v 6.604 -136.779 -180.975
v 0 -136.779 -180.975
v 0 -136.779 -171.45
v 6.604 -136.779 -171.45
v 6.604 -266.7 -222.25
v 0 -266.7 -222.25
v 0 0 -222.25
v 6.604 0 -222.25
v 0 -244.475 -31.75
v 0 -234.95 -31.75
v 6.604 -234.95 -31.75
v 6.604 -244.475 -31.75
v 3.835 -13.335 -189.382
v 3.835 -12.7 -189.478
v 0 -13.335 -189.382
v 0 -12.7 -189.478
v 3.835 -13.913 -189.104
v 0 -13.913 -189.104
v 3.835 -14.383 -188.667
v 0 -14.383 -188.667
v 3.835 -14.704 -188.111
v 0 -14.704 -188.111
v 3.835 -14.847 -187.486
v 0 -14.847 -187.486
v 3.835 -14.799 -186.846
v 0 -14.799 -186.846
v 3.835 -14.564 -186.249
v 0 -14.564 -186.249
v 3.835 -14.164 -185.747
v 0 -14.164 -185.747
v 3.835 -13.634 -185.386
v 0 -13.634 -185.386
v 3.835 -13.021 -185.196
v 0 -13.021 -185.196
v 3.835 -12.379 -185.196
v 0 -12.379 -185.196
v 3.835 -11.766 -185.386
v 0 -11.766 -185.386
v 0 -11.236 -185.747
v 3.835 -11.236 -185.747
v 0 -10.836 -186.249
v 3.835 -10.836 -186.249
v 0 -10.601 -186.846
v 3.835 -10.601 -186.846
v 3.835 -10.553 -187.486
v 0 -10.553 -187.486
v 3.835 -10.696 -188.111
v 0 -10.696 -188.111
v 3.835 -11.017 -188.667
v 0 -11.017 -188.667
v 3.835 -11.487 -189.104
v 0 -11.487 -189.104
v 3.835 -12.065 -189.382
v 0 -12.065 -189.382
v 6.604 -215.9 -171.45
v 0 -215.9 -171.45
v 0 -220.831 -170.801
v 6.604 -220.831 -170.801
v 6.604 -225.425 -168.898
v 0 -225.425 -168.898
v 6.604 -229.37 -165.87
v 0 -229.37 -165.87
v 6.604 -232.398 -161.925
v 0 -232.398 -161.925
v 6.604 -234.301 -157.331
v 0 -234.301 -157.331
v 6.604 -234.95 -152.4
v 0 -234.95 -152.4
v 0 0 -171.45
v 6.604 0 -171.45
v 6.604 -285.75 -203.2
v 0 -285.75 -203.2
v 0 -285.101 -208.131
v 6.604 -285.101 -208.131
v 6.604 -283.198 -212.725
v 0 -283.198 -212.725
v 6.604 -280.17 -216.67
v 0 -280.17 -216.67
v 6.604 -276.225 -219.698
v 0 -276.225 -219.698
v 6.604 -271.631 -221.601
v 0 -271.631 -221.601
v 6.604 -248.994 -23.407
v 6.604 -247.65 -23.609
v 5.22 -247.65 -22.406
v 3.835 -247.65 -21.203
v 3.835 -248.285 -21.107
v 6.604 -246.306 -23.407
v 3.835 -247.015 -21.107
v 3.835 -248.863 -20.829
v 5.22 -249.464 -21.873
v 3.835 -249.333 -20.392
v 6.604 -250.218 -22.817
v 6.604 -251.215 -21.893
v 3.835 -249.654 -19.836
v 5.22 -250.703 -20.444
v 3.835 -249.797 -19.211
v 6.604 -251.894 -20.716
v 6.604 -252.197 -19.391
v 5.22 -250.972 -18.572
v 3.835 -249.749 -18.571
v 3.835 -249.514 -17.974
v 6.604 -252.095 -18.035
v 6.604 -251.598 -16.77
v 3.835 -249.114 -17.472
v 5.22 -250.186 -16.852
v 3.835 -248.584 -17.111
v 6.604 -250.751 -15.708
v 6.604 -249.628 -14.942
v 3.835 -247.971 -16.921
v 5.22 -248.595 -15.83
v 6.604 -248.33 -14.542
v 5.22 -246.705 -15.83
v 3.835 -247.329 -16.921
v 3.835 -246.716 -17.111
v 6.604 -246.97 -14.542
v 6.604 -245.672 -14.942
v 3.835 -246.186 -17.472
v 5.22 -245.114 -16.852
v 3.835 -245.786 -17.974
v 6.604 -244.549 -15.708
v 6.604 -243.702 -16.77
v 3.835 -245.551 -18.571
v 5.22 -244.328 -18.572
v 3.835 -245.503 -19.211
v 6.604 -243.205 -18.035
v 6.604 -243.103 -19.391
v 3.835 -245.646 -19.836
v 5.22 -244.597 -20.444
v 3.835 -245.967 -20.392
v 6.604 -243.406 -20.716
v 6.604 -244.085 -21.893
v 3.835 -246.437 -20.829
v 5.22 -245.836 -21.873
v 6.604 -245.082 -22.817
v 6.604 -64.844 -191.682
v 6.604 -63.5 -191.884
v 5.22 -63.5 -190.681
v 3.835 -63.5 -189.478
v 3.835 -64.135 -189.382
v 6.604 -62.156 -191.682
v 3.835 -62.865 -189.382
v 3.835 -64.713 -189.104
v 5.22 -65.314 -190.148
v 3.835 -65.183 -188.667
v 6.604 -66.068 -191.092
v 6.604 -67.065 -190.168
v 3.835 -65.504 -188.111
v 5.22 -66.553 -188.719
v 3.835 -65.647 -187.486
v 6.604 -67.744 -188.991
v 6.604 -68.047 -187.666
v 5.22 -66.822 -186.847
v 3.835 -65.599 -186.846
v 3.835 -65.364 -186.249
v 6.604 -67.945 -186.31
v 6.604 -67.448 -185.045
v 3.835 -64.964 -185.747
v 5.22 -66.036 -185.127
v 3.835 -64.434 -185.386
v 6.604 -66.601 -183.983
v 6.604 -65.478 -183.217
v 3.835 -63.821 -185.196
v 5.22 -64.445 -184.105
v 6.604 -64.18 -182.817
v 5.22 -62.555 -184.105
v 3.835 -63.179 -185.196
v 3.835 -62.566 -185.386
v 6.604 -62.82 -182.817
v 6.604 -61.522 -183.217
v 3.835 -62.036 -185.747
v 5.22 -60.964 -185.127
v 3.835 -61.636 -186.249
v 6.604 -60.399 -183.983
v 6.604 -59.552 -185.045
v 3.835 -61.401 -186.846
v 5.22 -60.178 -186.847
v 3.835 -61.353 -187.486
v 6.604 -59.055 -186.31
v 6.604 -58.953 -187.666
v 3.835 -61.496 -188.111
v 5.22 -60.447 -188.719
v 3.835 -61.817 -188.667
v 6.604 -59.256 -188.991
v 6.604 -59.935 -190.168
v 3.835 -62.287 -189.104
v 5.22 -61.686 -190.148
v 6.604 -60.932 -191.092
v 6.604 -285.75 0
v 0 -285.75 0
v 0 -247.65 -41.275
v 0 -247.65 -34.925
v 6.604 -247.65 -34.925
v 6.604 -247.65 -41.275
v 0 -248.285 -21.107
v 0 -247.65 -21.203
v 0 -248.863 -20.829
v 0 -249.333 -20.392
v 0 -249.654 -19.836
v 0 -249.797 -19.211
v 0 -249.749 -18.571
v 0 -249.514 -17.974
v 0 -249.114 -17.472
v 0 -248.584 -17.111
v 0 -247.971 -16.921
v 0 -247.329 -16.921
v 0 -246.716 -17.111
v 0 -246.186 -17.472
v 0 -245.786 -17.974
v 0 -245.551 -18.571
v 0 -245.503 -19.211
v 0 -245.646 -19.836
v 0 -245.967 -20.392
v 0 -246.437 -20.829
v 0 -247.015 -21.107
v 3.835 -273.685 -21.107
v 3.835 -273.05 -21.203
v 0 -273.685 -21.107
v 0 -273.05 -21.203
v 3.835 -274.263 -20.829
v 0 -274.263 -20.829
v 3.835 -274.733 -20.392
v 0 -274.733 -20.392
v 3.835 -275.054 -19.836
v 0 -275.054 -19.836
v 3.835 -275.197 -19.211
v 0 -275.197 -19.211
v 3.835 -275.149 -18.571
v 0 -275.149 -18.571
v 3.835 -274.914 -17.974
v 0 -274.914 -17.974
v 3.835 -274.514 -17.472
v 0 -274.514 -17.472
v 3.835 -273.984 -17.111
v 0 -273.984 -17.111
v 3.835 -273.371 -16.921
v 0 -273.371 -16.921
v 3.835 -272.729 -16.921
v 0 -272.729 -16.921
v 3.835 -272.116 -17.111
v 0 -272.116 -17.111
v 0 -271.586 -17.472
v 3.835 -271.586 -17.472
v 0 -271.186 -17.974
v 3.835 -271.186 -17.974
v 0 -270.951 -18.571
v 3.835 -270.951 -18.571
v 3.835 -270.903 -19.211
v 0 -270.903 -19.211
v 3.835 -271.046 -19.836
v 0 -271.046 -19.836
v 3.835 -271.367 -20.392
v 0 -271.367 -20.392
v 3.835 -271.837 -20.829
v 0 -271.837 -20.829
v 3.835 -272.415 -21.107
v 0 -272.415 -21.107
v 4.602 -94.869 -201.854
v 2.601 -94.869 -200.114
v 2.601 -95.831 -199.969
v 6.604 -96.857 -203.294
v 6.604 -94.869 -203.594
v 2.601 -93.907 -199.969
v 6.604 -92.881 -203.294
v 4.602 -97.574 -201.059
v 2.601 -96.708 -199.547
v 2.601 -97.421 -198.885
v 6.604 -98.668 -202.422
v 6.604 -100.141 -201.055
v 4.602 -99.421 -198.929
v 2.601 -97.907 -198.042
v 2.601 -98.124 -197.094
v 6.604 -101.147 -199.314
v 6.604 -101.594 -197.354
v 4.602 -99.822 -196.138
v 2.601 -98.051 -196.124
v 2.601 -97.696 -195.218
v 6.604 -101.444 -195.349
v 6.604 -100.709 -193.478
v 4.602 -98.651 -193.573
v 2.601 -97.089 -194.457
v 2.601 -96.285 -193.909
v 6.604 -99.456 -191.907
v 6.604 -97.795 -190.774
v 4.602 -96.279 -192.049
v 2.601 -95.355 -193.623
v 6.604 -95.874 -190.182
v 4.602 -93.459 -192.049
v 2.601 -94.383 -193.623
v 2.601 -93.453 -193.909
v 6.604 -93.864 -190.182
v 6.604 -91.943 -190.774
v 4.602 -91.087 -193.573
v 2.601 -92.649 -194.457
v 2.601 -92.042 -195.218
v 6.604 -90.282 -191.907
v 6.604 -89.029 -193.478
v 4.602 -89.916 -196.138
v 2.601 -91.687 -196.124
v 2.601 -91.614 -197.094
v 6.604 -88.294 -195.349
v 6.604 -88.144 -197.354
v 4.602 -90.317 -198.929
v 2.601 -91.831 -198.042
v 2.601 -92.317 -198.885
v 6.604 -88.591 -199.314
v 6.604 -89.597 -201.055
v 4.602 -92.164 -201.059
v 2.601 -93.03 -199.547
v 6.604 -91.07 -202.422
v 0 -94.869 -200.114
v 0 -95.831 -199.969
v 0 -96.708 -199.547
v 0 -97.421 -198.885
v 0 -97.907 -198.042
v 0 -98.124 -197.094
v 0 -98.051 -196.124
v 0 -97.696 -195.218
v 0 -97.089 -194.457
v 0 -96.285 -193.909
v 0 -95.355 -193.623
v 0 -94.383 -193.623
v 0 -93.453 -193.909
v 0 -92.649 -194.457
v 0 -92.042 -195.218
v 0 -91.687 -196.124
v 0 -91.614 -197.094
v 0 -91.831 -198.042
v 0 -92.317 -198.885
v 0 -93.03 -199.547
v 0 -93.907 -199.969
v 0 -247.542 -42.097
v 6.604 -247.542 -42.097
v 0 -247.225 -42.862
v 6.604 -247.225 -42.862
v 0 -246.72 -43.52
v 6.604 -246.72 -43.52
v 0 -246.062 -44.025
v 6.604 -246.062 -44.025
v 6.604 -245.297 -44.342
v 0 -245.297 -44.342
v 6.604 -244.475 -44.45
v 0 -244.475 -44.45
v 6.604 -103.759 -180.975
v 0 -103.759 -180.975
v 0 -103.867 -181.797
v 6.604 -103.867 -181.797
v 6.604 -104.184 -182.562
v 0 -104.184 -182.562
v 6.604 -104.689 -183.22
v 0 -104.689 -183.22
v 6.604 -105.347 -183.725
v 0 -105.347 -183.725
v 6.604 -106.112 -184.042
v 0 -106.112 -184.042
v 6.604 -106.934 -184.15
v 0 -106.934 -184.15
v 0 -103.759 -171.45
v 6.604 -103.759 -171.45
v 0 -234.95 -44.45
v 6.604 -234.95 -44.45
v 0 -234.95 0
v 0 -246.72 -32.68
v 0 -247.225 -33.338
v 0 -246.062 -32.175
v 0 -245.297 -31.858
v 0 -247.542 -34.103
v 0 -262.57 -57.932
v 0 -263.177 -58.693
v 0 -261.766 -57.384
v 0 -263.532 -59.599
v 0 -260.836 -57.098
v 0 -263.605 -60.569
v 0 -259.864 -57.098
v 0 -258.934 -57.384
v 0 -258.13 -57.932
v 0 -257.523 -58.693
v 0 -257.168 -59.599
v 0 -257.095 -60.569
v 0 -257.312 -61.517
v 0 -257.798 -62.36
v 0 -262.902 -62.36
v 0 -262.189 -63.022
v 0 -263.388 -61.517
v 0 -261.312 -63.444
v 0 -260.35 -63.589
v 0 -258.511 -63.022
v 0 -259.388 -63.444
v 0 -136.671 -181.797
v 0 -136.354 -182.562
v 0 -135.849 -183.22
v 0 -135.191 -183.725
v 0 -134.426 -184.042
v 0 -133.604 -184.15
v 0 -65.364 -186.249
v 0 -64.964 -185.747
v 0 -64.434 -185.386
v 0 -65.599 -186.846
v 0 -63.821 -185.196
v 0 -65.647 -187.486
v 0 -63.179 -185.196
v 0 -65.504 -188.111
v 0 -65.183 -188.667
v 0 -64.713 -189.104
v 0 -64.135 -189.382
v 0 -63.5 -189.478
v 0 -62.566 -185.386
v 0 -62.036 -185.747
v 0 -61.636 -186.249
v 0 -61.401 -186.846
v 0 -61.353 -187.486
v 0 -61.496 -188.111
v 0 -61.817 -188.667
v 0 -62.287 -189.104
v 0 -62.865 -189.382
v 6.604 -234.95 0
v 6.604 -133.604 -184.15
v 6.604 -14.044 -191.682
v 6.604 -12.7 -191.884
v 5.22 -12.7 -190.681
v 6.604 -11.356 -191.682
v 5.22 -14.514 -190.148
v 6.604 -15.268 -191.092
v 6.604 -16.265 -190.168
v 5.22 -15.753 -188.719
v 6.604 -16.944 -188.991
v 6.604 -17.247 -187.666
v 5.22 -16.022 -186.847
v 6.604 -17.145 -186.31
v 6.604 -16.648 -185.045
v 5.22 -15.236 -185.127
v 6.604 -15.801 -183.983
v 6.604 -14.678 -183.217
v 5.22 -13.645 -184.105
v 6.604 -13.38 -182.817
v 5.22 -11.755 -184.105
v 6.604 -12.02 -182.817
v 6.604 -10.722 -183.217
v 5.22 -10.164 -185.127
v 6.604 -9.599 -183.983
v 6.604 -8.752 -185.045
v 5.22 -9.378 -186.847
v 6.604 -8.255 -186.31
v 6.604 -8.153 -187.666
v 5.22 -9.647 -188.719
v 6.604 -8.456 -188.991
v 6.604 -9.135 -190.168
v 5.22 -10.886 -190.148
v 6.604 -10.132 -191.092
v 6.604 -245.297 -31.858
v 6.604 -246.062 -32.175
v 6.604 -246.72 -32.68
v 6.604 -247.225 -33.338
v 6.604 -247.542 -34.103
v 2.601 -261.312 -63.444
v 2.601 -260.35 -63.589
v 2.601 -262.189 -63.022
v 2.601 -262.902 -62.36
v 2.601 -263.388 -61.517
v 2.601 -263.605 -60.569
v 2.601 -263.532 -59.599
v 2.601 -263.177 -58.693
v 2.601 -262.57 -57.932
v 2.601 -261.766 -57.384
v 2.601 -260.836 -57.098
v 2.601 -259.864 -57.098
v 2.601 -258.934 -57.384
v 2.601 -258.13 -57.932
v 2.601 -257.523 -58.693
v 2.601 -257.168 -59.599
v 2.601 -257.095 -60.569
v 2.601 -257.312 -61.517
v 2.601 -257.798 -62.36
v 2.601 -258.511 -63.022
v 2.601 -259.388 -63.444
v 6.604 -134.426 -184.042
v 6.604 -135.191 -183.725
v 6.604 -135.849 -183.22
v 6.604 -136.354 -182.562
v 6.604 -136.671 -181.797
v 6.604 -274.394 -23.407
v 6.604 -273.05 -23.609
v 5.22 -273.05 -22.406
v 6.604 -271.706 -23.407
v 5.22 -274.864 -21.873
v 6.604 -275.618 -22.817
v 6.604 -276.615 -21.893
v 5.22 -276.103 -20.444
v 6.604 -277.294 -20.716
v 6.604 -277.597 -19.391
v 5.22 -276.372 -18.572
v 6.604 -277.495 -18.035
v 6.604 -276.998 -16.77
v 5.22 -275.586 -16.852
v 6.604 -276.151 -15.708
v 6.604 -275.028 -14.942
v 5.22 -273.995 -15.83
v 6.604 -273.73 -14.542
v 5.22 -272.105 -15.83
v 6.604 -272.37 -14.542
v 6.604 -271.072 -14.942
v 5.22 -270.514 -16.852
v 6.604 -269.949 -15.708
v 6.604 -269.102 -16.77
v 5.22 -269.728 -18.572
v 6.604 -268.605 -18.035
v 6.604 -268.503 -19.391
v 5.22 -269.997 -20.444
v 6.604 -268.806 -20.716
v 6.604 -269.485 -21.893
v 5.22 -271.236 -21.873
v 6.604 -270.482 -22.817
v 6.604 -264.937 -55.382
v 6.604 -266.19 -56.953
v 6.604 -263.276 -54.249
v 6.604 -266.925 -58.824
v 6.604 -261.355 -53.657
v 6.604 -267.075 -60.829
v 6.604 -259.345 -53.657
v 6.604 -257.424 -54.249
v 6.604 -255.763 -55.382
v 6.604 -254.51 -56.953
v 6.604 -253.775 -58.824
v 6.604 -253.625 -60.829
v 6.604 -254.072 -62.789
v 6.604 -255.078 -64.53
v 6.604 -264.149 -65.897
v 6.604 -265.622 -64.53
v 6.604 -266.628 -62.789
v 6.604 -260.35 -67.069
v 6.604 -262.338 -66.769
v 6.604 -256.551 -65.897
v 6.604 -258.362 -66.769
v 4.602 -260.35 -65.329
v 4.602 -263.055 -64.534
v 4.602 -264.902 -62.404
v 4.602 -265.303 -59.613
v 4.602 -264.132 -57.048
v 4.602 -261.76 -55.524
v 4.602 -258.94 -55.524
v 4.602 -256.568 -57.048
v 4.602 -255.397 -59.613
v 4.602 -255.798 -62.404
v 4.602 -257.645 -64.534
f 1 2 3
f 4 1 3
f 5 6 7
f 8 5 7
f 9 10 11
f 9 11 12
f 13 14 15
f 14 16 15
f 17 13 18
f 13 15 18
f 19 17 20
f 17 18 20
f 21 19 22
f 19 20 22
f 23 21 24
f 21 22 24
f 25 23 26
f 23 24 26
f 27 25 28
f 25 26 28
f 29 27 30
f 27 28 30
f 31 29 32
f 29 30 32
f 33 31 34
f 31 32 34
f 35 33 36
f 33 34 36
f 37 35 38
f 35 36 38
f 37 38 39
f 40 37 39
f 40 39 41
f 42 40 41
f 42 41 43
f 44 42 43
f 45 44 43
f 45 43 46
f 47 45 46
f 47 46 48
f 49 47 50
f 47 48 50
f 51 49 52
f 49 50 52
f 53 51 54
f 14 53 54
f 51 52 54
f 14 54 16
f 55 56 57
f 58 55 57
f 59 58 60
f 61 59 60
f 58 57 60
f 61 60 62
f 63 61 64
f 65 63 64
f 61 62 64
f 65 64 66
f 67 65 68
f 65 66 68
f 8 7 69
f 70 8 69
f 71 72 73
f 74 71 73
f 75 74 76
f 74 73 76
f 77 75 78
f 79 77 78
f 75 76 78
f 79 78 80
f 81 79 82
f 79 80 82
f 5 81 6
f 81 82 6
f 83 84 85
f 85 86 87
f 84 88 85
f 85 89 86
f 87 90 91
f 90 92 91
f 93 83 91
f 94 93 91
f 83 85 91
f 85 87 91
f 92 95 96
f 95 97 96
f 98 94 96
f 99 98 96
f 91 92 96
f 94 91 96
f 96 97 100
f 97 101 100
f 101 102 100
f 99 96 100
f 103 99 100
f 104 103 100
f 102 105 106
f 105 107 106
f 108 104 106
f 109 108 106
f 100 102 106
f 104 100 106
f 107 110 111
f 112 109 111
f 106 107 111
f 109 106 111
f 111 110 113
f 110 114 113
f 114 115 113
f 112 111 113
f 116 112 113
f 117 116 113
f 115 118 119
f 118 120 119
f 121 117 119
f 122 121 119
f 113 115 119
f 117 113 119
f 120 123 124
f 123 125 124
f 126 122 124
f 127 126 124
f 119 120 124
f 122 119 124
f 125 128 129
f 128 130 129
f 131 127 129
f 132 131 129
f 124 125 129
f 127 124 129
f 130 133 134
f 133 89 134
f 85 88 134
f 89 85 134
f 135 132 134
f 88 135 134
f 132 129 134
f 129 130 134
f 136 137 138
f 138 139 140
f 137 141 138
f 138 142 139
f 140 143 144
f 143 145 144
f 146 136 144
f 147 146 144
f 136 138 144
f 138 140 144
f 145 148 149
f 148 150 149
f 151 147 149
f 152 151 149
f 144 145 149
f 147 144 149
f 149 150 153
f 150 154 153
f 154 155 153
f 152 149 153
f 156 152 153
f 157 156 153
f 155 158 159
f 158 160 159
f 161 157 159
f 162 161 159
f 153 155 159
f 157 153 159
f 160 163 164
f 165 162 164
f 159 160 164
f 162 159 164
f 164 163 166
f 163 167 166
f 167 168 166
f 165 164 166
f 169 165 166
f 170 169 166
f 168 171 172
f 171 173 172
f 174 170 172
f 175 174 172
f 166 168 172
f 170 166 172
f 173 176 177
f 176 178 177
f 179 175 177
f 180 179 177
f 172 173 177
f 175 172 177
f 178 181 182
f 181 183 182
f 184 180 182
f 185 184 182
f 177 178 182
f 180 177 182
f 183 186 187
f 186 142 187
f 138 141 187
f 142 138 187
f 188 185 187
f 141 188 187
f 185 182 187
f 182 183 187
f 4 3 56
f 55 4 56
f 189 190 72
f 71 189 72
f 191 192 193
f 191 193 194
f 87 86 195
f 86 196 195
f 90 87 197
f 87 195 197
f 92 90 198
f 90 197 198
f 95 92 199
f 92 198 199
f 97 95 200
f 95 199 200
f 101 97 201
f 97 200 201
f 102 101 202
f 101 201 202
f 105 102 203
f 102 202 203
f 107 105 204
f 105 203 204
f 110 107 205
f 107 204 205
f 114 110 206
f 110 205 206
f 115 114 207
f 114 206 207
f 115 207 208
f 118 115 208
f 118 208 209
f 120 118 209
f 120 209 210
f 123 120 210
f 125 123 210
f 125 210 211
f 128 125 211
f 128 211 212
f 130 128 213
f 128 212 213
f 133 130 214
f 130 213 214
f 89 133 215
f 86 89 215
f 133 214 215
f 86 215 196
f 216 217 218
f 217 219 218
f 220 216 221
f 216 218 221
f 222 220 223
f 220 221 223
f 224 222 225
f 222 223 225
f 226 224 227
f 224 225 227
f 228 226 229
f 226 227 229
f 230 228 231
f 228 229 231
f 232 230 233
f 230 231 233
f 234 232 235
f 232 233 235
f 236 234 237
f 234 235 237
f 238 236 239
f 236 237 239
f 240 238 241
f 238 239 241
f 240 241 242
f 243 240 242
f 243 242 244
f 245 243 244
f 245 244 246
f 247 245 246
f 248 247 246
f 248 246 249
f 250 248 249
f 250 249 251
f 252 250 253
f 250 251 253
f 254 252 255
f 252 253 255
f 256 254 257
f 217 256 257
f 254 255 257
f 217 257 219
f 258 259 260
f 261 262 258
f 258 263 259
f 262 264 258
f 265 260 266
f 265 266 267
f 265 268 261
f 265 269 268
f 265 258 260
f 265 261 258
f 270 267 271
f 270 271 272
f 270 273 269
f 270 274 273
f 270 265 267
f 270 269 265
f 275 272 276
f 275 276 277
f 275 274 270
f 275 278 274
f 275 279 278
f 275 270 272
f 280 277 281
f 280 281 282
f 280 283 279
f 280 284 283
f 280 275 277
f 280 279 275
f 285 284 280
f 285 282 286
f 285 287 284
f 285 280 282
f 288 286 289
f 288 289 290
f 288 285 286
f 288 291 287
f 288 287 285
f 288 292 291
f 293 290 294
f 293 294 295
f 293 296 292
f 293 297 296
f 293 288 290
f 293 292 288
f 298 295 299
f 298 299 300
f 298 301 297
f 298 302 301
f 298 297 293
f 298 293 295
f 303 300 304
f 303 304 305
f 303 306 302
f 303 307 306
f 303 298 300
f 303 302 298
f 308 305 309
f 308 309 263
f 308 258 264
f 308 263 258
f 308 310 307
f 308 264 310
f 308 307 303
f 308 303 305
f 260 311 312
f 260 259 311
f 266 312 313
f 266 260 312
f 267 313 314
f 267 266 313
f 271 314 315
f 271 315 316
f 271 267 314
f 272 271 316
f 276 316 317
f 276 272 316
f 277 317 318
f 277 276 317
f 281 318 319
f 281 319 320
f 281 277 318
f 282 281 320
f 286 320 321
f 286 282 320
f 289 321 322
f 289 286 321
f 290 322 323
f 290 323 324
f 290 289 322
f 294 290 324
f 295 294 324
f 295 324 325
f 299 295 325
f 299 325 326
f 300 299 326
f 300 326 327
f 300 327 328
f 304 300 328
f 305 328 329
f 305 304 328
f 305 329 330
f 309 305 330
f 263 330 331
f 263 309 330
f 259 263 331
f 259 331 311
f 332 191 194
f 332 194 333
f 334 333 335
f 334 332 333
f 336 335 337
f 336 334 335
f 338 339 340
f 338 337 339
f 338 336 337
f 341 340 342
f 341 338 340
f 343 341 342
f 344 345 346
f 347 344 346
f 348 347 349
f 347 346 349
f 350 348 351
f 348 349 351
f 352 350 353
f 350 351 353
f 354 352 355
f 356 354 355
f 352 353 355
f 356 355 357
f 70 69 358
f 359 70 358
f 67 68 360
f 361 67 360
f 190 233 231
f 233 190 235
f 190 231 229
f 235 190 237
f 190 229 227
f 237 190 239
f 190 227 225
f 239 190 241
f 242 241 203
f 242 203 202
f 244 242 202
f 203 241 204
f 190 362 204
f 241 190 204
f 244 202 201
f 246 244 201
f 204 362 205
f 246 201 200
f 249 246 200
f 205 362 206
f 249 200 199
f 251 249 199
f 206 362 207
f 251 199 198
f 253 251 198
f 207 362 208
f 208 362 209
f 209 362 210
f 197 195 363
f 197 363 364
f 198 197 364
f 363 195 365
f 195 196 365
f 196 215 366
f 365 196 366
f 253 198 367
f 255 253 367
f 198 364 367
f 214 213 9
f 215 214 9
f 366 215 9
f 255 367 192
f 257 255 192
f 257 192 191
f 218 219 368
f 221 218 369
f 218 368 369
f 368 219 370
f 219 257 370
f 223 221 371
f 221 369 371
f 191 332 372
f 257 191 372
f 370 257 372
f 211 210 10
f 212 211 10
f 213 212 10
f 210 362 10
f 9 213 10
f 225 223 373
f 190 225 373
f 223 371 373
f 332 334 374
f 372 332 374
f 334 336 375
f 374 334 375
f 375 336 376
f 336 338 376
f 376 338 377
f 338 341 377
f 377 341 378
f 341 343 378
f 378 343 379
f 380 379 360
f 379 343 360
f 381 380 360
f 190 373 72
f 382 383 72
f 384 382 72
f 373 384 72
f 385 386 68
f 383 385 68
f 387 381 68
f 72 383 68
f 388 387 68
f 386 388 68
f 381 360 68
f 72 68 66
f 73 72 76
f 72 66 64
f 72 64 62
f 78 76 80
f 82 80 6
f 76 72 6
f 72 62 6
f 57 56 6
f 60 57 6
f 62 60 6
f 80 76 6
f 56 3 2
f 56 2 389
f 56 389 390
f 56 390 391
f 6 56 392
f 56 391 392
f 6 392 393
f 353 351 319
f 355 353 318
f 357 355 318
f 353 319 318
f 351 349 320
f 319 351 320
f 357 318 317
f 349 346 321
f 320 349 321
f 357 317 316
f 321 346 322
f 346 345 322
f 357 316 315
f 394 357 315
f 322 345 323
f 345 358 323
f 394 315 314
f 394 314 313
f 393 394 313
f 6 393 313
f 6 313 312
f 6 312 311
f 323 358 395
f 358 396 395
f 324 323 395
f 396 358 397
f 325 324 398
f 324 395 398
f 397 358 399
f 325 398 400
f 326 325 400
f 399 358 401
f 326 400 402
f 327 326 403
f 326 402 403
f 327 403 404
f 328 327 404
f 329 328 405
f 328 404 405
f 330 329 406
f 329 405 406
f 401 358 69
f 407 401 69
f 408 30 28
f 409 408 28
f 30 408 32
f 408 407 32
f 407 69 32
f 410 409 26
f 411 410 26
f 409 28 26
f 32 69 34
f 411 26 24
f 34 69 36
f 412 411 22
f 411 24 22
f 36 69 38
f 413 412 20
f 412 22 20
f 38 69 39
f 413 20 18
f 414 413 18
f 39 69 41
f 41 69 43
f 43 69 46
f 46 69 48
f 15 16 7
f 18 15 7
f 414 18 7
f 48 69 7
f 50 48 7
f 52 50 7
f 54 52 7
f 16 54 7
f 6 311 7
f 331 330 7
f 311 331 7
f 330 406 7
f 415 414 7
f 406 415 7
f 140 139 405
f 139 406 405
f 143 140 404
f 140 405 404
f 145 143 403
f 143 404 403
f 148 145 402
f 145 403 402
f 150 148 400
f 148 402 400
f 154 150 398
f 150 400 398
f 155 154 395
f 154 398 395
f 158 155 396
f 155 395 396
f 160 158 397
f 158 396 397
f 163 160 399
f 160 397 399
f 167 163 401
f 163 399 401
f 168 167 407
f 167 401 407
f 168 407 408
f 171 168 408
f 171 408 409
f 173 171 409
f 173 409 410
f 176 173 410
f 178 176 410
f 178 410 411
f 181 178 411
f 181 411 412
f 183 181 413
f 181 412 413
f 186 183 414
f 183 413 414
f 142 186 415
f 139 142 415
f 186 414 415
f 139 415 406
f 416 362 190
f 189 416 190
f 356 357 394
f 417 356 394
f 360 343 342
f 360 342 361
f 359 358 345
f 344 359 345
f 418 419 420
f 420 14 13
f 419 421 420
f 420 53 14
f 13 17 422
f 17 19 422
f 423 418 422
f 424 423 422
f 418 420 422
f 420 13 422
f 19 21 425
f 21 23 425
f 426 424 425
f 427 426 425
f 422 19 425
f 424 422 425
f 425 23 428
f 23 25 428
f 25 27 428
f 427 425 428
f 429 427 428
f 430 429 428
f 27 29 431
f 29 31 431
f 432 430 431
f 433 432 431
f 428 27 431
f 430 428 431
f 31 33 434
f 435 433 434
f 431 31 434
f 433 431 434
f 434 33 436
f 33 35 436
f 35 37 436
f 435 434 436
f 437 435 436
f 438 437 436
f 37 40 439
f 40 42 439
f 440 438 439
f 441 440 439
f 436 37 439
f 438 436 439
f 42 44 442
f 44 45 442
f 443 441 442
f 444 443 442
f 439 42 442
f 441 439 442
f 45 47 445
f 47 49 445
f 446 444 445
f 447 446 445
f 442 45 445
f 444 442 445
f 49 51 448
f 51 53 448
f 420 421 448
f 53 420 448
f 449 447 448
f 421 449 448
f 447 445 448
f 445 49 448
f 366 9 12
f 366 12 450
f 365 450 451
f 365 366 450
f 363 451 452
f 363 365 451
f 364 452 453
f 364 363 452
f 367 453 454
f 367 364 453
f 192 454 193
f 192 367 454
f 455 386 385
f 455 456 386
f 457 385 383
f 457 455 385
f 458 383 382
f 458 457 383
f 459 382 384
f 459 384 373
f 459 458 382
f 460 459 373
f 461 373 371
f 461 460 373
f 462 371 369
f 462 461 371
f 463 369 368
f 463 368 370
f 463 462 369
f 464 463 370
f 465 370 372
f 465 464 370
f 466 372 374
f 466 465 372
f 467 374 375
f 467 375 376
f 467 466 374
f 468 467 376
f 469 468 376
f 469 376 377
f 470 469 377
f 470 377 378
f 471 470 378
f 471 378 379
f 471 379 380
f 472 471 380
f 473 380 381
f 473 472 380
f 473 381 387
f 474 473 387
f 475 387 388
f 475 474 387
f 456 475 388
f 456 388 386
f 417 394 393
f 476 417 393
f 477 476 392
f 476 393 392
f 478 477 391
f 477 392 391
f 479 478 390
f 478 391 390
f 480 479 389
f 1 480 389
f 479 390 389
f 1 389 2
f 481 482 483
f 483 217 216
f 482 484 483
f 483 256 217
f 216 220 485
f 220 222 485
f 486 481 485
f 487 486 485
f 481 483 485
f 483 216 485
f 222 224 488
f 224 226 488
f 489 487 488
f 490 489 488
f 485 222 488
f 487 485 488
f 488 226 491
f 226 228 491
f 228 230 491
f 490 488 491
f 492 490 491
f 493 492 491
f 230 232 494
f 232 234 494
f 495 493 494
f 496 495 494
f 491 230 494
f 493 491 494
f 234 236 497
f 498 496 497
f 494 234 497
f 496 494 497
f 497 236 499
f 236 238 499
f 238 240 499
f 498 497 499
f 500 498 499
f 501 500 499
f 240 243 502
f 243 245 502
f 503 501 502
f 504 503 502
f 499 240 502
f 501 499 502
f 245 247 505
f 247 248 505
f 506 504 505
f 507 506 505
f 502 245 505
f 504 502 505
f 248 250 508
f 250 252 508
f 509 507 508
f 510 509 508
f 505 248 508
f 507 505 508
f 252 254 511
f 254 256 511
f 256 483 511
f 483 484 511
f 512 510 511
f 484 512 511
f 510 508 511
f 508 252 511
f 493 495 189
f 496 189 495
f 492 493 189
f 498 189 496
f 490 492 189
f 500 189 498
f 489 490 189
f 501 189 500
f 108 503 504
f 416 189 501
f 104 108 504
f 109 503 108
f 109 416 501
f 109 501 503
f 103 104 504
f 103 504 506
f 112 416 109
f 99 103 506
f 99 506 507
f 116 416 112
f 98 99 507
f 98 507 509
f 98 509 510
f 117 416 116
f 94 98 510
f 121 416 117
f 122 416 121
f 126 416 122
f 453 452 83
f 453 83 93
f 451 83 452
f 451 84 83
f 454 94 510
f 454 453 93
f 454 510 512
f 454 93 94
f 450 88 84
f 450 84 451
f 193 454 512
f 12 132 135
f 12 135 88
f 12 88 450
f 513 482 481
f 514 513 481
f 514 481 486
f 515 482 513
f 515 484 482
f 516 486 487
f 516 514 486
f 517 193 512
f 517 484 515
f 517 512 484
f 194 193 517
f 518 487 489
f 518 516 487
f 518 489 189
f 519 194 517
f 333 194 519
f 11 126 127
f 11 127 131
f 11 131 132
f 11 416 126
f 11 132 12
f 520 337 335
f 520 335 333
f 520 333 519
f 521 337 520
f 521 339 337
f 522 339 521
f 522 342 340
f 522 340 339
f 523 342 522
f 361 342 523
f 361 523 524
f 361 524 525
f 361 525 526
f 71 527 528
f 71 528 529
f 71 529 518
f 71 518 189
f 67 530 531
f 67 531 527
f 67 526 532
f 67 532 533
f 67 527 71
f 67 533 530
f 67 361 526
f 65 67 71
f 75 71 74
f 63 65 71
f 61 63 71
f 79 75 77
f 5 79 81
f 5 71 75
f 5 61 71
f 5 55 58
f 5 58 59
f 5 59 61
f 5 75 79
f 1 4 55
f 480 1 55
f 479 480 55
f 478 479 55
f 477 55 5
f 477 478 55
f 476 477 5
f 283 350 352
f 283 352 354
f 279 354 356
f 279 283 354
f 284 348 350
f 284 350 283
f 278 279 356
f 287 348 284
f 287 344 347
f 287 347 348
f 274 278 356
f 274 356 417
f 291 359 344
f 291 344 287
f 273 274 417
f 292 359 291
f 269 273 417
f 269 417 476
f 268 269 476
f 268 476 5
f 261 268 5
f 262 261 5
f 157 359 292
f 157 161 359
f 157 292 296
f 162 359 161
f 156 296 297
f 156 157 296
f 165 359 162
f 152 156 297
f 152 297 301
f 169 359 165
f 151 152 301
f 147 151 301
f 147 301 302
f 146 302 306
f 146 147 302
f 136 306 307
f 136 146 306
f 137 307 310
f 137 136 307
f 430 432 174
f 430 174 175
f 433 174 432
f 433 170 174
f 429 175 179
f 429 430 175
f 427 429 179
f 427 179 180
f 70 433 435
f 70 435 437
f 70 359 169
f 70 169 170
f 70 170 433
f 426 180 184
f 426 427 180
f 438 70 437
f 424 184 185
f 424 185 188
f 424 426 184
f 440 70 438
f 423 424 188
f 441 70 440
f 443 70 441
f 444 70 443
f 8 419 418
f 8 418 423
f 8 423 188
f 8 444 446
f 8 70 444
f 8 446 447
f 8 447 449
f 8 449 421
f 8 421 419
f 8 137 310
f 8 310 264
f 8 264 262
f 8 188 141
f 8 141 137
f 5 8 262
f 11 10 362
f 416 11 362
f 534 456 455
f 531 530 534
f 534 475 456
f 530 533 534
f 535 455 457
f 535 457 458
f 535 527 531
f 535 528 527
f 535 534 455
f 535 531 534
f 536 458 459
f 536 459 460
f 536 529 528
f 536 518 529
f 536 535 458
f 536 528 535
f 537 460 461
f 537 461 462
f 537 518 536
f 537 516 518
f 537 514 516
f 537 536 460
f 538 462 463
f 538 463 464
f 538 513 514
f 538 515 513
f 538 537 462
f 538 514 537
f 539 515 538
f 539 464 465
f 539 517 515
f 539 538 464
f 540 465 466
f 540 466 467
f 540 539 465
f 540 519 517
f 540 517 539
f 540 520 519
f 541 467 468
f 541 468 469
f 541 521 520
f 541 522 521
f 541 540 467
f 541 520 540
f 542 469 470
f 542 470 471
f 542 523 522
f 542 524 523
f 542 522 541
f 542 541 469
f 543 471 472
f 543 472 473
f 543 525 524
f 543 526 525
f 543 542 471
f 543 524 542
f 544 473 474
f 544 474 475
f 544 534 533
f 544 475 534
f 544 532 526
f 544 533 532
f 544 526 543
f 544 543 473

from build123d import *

# Parameters (mm, degrees)
BOSS_EXTRUDE2_DEPTH                               = 6.604
CSK_FOR_8_FLAT_HEAD_SOCKET_CAP_SCREW1_D           = 4.3053
CSK_FOR_8_FLAT_HEAD_SOCKET_CAP_SCREW1_CSINK_D     = 9.1186
CSK_FOR_8_FLAT_HEAD_SOCKET_CAP_SCREW1_CSINK_ANGLE = 82
CSK_FOR_8_FLAT_HEAD_SOCKET_CAP_SCREW2_D           = 4.3053
CSK_FOR_8_FLAT_HEAD_SOCKET_CAP_SCREW2_CSINK_D     = 9.1186
CSK_FOR_8_FLAT_HEAD_SOCKET_CAP_SCREW2_CSINK_ANGLE = 82
CSK_FOR_1_4_FLAT_HEAD_SOCKET_CAP_SCR_2_COUNT      = 2
CSK_FOR_1_4_FLAT_HEAD_SOCKET_CAP_SCR_2_PITCH      = 214.529804424
CUT_EXTRUDE1_DEPTH                                = 7.604


with BuildPart() as part:
    # Sketch1 → Boss-Extrude2 (new body)
    with BuildSketch(Plane(origin=(0, 0, 0), x_dir=(0, 0, -1), z_dir=(1, 0, 0))):
        with BuildLine():
            Line((0, -234.95), (0, -285.75))
            Line((0, -285.75), (203.2, -285.75))
            ThreePointArc((203.2, -285.75), (216.670384182, -280.170384182), (222.25, -266.7))
            Line((222.25, -266.7), (222.25, 0))
            Line((222.25, 0), (171.45, 0))
            Line((171.45, 0), (171.45, -215.9))
            ThreePointArc((171.45, -215.9), (165.870384182, -229.370384182), (152.4, -234.95))
            Line((152.4, -234.95), (0, -234.95))
        make_face()
    extrude(amount=BOSS_EXTRUDE2_DEPTH)

    # CSK for #8 Flat Head Socket Cap Screw1 (through all)
    with Locations(Plane(origin=(6.604, -103.971373163, -28.9631092), x_dir=(0, 0, 1), z_dir=(1, 0, 0))):
        with Locations((-158.3618908, -91.271373163), (-158.3618908, -40.471373163)):
            CounterSinkHole(CSK_FOR_8_FLAT_HEAD_SOCKET_CAP_SCREW1_D / 2, CSK_FOR_8_FLAT_HEAD_SOCKET_CAP_SCREW1_CSINK_D / 2, counter_sink_angle=CSK_FOR_8_FLAT_HEAD_SOCKET_CAP_SCREW1_CSINK_ANGLE)

    # CSK for #8 Flat Head Socket Cap Screw2 (through all)
    with Locations(Plane(origin=(6.604, 143.822396254, -169.282653802), x_dir=(0, 0, 1), z_dir=(1, 0, 0))):
        with Locations((150.232653802, 391.472396254), (150.232653802, 416.872396254)):
            CounterSinkHole(CSK_FOR_8_FLAT_HEAD_SOCKET_CAP_SCREW2_D / 2, CSK_FOR_8_FLAT_HEAD_SOCKET_CAP_SCREW2_CSINK_D / 2, counter_sink_angle=CSK_FOR_8_FLAT_HEAD_SOCKET_CAP_SCREW2_CSINK_ANGLE)

    # Sketch9 → CSK for 1/4 Flat Head Socket Cap Screw1 (revolve, cut)
    with BuildSketch(Plane(origin=(6.604, -94.869, -196.85), x_dir=(0, 0, -1), z_dir=(0, 1, 0))):
        Polygon((0, 0), (0, 6.604), (3.2639, 6.604), (3.2639, 4.003051983), (6.7437, 0), align=None)
    csk_for_1_4_flat_head_socket_cap_screw1 = revolve(axis=Axis((12.954, -94.869, -196.85), (-1, 0, 0)), mode=Mode.SUBTRACT)

    # CSK for 1_4 Flat Head Socket Cap Scr 2: CSK for 1/4 Flat Head Socket Cap Screw1 ×2
    with Locations(*[Vector(0, -0.771366013, 0.636391761) * (i * CSK_FOR_1_4_FLAT_HEAD_SOCKET_CAP_SCR_2_PITCH) for i in range(1, CSK_FOR_1_4_FLAT_HEAD_SOCKET_CAP_SCR_2_COUNT)]):
        add(csk_for_1_4_flat_head_socket_cap_screw1, mode=Mode.SUBTRACT)

    # Sketch11 → Cut-Extrude1 (cut, through all)
    with BuildSketch(Plane.ZY):
        with BuildLine():
            Line((-171.45, -103.759), (-180.975, -103.759))
            ThreePointArc((-180.975, -103.759), (-183.22006403, -104.68893597), (-184.15, -106.934))
            Line((-184.15, -106.934), (-184.15, -133.604))
            ThreePointArc((-184.15, -133.604), (-183.22006403, -135.84906403), (-180.975, -136.779))
            Line((-180.975, -136.779), (-171.45, -136.779))
            Line((-171.45, -136.779), (-171.45, -103.759))
        make_face()
        with BuildLine():
            Line((-44.45, -234.95), (-31.75, -234.95))
            Line((-31.75, -234.95), (-31.75, -244.475))
            ThreePointArc((-31.75, -244.475), (-32.67993597, -246.72006403), (-34.925, -247.65))
            Line((-34.925, -247.65), (-41.275, -247.65))
            ThreePointArc((-41.275, -247.65), (-43.52006403, -246.72006403), (-44.45, -244.475))
            Line((-44.45, -244.475), (-44.45, -234.95))
        make_face()
    extrude(amount=-CUT_EXTRUDE1_DEPTH, mode=Mode.SUBTRACT)


solid = part.part
